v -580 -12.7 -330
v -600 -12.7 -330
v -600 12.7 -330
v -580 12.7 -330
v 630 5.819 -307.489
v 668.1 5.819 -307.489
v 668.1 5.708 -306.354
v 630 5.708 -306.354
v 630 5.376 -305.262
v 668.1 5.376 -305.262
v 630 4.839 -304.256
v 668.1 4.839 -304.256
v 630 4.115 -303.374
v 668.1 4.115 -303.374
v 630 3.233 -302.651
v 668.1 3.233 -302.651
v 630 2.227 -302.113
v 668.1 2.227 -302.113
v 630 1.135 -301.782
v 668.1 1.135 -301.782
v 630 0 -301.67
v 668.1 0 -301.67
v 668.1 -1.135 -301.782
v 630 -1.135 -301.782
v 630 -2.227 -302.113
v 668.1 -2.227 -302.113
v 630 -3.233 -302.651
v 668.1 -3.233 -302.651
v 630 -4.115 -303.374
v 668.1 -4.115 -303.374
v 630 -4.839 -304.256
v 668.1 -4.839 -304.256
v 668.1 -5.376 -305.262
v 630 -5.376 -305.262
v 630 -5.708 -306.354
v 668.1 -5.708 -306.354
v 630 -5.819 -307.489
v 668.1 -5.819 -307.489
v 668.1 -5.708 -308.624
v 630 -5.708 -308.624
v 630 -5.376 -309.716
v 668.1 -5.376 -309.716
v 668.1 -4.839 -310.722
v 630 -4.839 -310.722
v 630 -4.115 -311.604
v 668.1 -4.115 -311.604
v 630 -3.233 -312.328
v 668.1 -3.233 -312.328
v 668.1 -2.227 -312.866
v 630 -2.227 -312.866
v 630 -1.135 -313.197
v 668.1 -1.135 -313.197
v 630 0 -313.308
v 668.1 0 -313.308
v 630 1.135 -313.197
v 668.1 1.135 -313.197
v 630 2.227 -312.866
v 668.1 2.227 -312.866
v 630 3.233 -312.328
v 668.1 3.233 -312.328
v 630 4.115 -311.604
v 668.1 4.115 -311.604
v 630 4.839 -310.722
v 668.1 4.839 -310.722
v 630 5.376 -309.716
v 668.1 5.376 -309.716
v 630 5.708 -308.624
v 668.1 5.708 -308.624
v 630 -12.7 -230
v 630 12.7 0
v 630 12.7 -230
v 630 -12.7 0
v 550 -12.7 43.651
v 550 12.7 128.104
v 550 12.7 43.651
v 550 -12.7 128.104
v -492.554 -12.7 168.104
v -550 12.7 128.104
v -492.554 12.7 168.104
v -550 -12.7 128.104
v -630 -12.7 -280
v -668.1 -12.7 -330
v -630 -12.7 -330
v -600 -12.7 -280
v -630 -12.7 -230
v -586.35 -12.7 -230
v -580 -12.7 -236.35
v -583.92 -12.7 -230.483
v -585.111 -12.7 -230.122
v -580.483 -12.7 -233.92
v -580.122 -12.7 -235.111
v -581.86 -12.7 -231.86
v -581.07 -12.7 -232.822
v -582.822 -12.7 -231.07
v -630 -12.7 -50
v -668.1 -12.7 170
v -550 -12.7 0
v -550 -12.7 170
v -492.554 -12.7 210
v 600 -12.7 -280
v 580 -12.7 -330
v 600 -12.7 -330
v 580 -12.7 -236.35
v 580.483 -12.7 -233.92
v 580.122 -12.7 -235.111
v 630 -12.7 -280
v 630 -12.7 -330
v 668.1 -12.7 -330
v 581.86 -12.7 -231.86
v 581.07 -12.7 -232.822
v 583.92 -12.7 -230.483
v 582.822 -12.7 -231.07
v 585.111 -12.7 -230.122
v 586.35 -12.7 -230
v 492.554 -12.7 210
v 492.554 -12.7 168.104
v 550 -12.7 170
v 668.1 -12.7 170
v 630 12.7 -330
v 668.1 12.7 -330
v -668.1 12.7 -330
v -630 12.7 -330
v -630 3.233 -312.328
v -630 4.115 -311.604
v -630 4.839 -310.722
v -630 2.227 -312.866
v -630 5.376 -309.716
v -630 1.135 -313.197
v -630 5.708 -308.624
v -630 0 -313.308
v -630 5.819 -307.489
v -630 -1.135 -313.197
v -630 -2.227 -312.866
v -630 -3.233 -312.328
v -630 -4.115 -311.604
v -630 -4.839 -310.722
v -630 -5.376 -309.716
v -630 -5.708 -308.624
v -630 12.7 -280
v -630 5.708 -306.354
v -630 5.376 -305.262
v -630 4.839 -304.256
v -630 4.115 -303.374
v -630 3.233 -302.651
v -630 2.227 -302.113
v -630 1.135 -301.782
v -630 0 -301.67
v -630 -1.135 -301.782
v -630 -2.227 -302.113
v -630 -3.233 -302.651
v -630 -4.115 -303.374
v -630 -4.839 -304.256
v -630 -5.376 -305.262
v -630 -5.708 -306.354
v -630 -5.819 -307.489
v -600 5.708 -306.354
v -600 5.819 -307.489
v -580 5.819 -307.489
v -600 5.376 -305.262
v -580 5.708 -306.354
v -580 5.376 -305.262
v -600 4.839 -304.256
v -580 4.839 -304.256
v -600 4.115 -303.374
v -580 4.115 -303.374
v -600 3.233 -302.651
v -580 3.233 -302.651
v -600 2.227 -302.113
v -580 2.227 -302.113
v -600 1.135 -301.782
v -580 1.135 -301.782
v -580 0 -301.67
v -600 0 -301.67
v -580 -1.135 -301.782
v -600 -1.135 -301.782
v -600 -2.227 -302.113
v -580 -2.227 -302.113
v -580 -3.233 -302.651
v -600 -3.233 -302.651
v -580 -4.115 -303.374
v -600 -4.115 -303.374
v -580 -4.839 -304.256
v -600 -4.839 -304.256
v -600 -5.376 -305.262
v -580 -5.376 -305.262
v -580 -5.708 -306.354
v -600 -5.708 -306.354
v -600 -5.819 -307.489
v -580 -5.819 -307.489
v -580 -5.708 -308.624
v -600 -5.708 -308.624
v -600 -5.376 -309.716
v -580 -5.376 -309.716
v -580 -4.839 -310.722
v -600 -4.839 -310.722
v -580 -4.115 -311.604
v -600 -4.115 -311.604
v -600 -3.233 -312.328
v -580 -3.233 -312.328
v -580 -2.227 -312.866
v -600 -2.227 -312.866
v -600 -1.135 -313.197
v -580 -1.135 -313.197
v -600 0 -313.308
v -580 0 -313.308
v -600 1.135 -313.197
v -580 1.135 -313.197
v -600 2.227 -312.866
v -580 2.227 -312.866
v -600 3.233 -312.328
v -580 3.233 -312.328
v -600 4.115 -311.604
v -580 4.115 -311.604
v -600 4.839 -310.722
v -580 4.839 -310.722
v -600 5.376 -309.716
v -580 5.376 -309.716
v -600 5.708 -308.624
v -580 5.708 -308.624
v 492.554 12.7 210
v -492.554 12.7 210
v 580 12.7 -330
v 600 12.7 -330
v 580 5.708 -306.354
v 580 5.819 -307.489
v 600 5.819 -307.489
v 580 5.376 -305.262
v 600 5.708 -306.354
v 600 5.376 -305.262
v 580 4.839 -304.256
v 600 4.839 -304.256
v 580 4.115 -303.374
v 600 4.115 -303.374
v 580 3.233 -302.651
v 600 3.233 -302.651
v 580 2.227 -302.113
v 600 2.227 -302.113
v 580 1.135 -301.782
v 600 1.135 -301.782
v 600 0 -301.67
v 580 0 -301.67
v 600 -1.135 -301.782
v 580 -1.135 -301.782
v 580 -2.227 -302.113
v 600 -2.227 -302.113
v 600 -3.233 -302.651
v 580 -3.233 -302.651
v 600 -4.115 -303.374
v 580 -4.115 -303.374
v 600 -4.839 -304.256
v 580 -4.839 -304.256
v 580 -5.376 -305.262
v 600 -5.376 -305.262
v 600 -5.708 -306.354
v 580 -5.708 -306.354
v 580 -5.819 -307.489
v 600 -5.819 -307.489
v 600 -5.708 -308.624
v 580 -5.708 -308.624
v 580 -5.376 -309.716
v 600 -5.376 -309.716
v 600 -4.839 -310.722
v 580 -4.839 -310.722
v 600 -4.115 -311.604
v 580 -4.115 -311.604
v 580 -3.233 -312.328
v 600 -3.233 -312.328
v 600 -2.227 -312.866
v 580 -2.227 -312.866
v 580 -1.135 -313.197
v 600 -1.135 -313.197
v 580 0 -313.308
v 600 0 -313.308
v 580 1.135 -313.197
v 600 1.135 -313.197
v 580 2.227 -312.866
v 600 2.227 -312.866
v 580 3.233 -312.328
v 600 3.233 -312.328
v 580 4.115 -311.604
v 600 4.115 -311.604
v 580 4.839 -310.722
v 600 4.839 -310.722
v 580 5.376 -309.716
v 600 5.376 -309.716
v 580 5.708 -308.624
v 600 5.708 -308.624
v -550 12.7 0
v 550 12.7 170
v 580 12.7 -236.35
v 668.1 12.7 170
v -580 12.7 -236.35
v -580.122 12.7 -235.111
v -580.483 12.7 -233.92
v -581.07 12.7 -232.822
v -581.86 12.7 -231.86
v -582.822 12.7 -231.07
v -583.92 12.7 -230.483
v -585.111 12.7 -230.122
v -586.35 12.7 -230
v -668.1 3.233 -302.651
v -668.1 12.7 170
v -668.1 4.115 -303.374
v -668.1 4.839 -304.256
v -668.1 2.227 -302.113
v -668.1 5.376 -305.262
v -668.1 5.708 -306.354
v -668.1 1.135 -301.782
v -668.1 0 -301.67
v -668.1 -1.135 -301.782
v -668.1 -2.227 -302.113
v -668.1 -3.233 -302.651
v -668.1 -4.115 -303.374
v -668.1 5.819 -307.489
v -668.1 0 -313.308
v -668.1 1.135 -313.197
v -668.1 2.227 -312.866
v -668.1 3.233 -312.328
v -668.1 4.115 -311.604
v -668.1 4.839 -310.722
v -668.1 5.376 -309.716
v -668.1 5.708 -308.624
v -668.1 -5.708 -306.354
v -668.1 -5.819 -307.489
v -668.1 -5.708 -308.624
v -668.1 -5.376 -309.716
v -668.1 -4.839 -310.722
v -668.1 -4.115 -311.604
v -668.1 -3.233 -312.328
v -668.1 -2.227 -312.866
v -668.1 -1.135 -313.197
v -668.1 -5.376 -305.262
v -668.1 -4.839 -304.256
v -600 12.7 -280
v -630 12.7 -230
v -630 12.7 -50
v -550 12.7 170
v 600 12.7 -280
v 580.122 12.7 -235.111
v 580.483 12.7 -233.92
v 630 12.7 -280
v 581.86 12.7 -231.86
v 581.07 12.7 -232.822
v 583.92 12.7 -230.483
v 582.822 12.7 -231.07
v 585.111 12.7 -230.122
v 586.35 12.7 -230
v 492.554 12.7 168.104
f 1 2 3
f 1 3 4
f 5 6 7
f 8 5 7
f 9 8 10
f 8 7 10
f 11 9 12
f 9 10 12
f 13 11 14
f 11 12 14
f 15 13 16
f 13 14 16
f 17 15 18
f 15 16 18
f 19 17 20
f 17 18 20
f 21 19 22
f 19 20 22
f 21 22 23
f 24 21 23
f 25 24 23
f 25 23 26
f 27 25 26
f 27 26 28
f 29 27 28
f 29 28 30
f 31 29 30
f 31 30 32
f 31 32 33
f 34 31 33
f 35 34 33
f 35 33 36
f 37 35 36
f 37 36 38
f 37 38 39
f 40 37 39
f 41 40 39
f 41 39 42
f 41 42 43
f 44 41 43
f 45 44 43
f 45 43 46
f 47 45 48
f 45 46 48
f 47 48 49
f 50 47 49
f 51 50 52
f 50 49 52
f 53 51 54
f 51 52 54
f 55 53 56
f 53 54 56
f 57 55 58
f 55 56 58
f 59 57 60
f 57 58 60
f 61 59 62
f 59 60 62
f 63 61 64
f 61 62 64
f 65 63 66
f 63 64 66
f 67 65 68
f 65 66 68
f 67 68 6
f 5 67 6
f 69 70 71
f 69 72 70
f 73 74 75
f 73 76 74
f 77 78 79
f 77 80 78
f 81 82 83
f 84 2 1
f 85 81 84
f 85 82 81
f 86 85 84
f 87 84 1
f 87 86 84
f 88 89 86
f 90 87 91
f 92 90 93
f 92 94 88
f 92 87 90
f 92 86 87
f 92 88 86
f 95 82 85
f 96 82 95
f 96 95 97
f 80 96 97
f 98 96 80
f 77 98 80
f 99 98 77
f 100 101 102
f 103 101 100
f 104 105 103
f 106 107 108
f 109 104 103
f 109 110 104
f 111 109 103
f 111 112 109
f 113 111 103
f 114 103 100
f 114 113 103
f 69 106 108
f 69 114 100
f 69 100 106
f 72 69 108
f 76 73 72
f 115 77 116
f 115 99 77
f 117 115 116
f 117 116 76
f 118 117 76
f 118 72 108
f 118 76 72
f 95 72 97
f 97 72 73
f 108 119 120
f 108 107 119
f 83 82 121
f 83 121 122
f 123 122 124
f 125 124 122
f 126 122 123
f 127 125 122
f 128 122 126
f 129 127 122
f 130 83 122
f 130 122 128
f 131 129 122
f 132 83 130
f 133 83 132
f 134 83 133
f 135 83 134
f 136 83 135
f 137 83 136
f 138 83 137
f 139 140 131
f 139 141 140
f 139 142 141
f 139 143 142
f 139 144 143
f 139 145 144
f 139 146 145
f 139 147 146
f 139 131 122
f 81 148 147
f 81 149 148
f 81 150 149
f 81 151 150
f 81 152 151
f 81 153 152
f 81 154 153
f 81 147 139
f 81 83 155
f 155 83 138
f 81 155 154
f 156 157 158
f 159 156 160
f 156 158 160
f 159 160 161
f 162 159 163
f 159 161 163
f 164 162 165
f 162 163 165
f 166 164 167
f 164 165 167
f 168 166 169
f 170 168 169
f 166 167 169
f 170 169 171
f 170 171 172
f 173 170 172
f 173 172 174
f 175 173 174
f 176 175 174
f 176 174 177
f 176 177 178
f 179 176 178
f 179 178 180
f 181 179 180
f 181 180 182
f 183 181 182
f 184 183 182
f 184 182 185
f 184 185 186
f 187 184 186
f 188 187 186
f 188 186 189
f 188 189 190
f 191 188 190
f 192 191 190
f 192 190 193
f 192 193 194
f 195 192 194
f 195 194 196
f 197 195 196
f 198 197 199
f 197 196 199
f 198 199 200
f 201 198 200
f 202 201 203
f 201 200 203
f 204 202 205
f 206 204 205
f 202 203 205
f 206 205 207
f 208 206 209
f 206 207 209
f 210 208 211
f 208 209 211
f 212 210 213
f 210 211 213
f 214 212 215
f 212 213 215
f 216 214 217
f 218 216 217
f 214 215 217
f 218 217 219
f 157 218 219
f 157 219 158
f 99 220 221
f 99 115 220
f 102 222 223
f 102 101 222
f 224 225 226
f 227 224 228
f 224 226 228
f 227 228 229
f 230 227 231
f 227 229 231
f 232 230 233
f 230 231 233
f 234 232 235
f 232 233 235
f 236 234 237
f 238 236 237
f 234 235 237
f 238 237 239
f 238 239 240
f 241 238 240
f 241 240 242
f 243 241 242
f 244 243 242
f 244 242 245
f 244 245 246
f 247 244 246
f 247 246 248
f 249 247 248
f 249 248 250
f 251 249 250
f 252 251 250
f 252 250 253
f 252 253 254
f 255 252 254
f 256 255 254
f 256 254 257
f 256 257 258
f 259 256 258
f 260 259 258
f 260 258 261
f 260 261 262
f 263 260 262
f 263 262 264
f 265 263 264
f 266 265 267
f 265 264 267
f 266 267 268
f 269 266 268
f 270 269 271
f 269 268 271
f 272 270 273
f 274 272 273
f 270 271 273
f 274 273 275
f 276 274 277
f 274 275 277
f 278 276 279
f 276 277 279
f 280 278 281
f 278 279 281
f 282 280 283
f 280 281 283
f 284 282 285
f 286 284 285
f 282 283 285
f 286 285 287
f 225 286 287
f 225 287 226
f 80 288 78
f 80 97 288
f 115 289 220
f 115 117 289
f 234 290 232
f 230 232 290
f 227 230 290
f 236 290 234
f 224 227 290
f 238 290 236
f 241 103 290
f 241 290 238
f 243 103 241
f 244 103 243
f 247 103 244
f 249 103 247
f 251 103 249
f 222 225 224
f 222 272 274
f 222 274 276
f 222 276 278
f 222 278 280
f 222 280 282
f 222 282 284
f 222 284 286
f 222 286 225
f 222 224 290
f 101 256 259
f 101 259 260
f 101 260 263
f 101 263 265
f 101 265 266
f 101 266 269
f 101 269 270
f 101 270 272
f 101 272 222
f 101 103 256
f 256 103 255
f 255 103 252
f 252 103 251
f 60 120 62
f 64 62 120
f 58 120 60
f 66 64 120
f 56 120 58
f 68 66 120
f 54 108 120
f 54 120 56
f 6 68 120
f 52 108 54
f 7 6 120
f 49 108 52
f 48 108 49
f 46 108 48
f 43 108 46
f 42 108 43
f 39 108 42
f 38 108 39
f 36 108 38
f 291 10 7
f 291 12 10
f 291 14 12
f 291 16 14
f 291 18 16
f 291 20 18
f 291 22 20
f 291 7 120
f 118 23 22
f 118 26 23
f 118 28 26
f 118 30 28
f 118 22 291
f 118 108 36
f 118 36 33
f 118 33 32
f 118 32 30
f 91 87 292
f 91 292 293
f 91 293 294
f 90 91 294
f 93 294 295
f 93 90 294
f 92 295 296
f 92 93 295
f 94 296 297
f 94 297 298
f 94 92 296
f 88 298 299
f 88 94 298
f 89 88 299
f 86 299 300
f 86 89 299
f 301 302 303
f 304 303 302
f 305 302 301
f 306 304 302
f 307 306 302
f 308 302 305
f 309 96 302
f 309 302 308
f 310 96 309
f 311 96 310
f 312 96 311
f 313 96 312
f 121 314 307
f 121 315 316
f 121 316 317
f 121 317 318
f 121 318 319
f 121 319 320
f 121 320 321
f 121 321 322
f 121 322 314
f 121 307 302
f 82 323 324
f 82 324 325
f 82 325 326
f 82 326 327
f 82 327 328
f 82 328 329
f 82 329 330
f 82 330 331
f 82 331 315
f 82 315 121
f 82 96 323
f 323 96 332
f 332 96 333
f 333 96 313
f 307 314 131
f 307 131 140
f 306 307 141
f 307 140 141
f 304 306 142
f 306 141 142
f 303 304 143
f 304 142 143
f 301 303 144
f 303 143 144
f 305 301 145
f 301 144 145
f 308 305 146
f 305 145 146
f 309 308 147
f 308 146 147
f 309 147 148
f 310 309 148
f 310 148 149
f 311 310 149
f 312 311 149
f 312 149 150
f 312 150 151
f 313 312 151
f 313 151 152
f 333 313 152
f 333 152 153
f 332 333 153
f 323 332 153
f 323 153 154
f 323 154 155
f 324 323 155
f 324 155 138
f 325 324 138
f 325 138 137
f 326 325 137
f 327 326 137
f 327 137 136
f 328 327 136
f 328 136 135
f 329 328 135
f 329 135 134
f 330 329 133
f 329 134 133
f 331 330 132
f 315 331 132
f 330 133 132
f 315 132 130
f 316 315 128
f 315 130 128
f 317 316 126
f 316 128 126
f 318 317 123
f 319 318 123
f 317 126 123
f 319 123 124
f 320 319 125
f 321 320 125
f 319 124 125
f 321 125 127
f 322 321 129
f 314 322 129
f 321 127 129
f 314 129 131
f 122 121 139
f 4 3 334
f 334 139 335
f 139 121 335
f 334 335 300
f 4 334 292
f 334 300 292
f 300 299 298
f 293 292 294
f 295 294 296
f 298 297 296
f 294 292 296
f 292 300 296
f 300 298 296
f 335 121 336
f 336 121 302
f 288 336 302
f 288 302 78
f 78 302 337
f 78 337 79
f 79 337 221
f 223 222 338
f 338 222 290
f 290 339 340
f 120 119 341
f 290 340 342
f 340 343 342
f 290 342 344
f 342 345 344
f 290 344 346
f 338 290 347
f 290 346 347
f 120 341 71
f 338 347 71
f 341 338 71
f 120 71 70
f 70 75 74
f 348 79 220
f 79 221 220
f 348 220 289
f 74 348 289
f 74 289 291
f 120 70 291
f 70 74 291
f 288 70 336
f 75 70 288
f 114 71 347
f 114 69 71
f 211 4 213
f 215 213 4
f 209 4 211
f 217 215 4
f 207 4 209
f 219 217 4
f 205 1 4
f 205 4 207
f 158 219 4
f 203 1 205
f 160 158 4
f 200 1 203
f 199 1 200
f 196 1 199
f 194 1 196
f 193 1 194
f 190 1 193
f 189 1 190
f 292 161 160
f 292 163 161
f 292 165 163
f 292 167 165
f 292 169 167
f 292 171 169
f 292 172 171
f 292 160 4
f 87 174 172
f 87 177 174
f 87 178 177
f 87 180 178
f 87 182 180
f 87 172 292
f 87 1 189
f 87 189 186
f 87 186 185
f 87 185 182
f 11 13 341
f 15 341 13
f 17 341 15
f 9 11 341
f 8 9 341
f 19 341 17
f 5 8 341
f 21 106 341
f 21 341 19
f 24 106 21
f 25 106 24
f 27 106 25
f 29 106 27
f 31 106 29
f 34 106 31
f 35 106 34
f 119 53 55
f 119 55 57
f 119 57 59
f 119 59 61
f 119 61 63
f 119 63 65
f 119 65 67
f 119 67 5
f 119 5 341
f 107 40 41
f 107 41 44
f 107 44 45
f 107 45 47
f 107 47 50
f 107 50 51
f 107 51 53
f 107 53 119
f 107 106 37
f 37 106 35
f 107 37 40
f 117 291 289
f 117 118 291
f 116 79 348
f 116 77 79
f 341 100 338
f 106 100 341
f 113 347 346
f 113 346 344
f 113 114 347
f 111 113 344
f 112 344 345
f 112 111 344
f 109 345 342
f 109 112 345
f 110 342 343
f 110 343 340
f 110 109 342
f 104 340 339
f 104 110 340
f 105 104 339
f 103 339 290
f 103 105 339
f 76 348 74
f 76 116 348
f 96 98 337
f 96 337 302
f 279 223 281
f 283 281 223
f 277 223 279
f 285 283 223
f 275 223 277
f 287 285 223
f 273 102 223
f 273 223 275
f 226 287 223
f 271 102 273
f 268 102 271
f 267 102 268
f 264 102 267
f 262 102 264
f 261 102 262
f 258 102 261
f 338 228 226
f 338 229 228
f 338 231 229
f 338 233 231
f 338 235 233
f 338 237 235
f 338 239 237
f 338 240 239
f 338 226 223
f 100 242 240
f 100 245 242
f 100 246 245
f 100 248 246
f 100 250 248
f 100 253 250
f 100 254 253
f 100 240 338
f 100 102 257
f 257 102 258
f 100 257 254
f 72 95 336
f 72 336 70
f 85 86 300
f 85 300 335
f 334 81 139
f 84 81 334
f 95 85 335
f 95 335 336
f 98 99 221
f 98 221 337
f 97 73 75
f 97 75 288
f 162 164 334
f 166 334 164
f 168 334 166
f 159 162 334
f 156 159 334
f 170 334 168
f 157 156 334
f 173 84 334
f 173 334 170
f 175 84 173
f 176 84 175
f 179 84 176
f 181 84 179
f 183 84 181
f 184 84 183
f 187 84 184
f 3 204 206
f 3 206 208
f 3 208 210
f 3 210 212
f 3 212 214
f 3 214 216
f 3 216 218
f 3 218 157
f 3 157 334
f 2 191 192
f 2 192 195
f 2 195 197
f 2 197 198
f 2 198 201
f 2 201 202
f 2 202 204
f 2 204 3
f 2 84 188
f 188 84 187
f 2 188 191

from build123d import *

# Parameters (mm, degrees)
F1_DEPTH = 12.7
F2_R     = 5.8193233161
F3_DEPTH = 1800


# Not quite as in the source:
# - a feature names something its author has since deleted; it is built from what else it names


with BuildPart() as f1:
    # F0 (on Front) → F1 (new body, symmetric)
    with BuildSketch(Plane.XZ):
        with BuildLine():
            Line((492.5543735346, 210), (0, 210))
            Line((0, 210), (-492.5543735346, 210))
            Line((-492.5543735346, 210), (-550, 170))
            Line((-550, 170), (-630, 170))
            Line((-630, 170), (-668.1, 170))
            Line((-668.1, 170), (-668.1, -230))
            Line((-668.1, -230), (-668.1, -330))
            Line((-668.1, -330), (-630, -330))
            Line((-630, -330), (-630, -280))
            Line((-630, -280), (-600, -280))
            Line((-600, -280), (-600, -330))
            Line((-600, -330), (-580, -330))
            Line((-580, -330), (-580, -236.35))
            ThreePointArc((-580, -236.35), (-581.8598719395, -231.8598719395), (-586.35, -230))
            Line((-586.35, -230), (-630, -230))
            Line((-630, -230), (-630, -50))
            Line((-630, -50), (630, 0))
            Line((630, 0), (630, -50))
            Line((630, -50), (630, -230))
            Line((630, -230), (586.35, -230))
            ThreePointArc((586.35, -230), (581.8598719395, -231.8598719395), (580, -236.35))
            Line((580, -236.35), (580, -330))
            Line((580, -330), (600, -330))
            Line((600, -330), (600, -280))
            Line((600, -280), (630, -280))
            Line((630, -280), (630, -330))
            Line((630, -330), (668.1, -330))
            Line((668.1, -330), (668.1, -230))
            Line((668.1, -230), (668.1, 170))
            Line((668.1, 170), (630, 170))
            Line((630, 170), (550, 170))
            Line((550, 170), (492.5543735346, 210))
        make_face()
        Polygon((550, 43.6507936508), (-550, 0), (-550, 128.1044334173), (-492.5543735346, 168.1044334173), (492.5543735346, 168.1044334173), (550, 128.1044334173), align=None, mode=Mode.SUBTRACT)
    extrude(amount=F1_DEPTH, both=True)

    # F2 (on face) → F3 (cut)
    with BuildSketch(Plane.YZ.offset(668.1)):
        with Locations((0, -307.489156723)):
            Circle(F2_R)
    extrude(amount=-F3_DEPTH, mode=Mode.SUBTRACT)


solid = f1.part
